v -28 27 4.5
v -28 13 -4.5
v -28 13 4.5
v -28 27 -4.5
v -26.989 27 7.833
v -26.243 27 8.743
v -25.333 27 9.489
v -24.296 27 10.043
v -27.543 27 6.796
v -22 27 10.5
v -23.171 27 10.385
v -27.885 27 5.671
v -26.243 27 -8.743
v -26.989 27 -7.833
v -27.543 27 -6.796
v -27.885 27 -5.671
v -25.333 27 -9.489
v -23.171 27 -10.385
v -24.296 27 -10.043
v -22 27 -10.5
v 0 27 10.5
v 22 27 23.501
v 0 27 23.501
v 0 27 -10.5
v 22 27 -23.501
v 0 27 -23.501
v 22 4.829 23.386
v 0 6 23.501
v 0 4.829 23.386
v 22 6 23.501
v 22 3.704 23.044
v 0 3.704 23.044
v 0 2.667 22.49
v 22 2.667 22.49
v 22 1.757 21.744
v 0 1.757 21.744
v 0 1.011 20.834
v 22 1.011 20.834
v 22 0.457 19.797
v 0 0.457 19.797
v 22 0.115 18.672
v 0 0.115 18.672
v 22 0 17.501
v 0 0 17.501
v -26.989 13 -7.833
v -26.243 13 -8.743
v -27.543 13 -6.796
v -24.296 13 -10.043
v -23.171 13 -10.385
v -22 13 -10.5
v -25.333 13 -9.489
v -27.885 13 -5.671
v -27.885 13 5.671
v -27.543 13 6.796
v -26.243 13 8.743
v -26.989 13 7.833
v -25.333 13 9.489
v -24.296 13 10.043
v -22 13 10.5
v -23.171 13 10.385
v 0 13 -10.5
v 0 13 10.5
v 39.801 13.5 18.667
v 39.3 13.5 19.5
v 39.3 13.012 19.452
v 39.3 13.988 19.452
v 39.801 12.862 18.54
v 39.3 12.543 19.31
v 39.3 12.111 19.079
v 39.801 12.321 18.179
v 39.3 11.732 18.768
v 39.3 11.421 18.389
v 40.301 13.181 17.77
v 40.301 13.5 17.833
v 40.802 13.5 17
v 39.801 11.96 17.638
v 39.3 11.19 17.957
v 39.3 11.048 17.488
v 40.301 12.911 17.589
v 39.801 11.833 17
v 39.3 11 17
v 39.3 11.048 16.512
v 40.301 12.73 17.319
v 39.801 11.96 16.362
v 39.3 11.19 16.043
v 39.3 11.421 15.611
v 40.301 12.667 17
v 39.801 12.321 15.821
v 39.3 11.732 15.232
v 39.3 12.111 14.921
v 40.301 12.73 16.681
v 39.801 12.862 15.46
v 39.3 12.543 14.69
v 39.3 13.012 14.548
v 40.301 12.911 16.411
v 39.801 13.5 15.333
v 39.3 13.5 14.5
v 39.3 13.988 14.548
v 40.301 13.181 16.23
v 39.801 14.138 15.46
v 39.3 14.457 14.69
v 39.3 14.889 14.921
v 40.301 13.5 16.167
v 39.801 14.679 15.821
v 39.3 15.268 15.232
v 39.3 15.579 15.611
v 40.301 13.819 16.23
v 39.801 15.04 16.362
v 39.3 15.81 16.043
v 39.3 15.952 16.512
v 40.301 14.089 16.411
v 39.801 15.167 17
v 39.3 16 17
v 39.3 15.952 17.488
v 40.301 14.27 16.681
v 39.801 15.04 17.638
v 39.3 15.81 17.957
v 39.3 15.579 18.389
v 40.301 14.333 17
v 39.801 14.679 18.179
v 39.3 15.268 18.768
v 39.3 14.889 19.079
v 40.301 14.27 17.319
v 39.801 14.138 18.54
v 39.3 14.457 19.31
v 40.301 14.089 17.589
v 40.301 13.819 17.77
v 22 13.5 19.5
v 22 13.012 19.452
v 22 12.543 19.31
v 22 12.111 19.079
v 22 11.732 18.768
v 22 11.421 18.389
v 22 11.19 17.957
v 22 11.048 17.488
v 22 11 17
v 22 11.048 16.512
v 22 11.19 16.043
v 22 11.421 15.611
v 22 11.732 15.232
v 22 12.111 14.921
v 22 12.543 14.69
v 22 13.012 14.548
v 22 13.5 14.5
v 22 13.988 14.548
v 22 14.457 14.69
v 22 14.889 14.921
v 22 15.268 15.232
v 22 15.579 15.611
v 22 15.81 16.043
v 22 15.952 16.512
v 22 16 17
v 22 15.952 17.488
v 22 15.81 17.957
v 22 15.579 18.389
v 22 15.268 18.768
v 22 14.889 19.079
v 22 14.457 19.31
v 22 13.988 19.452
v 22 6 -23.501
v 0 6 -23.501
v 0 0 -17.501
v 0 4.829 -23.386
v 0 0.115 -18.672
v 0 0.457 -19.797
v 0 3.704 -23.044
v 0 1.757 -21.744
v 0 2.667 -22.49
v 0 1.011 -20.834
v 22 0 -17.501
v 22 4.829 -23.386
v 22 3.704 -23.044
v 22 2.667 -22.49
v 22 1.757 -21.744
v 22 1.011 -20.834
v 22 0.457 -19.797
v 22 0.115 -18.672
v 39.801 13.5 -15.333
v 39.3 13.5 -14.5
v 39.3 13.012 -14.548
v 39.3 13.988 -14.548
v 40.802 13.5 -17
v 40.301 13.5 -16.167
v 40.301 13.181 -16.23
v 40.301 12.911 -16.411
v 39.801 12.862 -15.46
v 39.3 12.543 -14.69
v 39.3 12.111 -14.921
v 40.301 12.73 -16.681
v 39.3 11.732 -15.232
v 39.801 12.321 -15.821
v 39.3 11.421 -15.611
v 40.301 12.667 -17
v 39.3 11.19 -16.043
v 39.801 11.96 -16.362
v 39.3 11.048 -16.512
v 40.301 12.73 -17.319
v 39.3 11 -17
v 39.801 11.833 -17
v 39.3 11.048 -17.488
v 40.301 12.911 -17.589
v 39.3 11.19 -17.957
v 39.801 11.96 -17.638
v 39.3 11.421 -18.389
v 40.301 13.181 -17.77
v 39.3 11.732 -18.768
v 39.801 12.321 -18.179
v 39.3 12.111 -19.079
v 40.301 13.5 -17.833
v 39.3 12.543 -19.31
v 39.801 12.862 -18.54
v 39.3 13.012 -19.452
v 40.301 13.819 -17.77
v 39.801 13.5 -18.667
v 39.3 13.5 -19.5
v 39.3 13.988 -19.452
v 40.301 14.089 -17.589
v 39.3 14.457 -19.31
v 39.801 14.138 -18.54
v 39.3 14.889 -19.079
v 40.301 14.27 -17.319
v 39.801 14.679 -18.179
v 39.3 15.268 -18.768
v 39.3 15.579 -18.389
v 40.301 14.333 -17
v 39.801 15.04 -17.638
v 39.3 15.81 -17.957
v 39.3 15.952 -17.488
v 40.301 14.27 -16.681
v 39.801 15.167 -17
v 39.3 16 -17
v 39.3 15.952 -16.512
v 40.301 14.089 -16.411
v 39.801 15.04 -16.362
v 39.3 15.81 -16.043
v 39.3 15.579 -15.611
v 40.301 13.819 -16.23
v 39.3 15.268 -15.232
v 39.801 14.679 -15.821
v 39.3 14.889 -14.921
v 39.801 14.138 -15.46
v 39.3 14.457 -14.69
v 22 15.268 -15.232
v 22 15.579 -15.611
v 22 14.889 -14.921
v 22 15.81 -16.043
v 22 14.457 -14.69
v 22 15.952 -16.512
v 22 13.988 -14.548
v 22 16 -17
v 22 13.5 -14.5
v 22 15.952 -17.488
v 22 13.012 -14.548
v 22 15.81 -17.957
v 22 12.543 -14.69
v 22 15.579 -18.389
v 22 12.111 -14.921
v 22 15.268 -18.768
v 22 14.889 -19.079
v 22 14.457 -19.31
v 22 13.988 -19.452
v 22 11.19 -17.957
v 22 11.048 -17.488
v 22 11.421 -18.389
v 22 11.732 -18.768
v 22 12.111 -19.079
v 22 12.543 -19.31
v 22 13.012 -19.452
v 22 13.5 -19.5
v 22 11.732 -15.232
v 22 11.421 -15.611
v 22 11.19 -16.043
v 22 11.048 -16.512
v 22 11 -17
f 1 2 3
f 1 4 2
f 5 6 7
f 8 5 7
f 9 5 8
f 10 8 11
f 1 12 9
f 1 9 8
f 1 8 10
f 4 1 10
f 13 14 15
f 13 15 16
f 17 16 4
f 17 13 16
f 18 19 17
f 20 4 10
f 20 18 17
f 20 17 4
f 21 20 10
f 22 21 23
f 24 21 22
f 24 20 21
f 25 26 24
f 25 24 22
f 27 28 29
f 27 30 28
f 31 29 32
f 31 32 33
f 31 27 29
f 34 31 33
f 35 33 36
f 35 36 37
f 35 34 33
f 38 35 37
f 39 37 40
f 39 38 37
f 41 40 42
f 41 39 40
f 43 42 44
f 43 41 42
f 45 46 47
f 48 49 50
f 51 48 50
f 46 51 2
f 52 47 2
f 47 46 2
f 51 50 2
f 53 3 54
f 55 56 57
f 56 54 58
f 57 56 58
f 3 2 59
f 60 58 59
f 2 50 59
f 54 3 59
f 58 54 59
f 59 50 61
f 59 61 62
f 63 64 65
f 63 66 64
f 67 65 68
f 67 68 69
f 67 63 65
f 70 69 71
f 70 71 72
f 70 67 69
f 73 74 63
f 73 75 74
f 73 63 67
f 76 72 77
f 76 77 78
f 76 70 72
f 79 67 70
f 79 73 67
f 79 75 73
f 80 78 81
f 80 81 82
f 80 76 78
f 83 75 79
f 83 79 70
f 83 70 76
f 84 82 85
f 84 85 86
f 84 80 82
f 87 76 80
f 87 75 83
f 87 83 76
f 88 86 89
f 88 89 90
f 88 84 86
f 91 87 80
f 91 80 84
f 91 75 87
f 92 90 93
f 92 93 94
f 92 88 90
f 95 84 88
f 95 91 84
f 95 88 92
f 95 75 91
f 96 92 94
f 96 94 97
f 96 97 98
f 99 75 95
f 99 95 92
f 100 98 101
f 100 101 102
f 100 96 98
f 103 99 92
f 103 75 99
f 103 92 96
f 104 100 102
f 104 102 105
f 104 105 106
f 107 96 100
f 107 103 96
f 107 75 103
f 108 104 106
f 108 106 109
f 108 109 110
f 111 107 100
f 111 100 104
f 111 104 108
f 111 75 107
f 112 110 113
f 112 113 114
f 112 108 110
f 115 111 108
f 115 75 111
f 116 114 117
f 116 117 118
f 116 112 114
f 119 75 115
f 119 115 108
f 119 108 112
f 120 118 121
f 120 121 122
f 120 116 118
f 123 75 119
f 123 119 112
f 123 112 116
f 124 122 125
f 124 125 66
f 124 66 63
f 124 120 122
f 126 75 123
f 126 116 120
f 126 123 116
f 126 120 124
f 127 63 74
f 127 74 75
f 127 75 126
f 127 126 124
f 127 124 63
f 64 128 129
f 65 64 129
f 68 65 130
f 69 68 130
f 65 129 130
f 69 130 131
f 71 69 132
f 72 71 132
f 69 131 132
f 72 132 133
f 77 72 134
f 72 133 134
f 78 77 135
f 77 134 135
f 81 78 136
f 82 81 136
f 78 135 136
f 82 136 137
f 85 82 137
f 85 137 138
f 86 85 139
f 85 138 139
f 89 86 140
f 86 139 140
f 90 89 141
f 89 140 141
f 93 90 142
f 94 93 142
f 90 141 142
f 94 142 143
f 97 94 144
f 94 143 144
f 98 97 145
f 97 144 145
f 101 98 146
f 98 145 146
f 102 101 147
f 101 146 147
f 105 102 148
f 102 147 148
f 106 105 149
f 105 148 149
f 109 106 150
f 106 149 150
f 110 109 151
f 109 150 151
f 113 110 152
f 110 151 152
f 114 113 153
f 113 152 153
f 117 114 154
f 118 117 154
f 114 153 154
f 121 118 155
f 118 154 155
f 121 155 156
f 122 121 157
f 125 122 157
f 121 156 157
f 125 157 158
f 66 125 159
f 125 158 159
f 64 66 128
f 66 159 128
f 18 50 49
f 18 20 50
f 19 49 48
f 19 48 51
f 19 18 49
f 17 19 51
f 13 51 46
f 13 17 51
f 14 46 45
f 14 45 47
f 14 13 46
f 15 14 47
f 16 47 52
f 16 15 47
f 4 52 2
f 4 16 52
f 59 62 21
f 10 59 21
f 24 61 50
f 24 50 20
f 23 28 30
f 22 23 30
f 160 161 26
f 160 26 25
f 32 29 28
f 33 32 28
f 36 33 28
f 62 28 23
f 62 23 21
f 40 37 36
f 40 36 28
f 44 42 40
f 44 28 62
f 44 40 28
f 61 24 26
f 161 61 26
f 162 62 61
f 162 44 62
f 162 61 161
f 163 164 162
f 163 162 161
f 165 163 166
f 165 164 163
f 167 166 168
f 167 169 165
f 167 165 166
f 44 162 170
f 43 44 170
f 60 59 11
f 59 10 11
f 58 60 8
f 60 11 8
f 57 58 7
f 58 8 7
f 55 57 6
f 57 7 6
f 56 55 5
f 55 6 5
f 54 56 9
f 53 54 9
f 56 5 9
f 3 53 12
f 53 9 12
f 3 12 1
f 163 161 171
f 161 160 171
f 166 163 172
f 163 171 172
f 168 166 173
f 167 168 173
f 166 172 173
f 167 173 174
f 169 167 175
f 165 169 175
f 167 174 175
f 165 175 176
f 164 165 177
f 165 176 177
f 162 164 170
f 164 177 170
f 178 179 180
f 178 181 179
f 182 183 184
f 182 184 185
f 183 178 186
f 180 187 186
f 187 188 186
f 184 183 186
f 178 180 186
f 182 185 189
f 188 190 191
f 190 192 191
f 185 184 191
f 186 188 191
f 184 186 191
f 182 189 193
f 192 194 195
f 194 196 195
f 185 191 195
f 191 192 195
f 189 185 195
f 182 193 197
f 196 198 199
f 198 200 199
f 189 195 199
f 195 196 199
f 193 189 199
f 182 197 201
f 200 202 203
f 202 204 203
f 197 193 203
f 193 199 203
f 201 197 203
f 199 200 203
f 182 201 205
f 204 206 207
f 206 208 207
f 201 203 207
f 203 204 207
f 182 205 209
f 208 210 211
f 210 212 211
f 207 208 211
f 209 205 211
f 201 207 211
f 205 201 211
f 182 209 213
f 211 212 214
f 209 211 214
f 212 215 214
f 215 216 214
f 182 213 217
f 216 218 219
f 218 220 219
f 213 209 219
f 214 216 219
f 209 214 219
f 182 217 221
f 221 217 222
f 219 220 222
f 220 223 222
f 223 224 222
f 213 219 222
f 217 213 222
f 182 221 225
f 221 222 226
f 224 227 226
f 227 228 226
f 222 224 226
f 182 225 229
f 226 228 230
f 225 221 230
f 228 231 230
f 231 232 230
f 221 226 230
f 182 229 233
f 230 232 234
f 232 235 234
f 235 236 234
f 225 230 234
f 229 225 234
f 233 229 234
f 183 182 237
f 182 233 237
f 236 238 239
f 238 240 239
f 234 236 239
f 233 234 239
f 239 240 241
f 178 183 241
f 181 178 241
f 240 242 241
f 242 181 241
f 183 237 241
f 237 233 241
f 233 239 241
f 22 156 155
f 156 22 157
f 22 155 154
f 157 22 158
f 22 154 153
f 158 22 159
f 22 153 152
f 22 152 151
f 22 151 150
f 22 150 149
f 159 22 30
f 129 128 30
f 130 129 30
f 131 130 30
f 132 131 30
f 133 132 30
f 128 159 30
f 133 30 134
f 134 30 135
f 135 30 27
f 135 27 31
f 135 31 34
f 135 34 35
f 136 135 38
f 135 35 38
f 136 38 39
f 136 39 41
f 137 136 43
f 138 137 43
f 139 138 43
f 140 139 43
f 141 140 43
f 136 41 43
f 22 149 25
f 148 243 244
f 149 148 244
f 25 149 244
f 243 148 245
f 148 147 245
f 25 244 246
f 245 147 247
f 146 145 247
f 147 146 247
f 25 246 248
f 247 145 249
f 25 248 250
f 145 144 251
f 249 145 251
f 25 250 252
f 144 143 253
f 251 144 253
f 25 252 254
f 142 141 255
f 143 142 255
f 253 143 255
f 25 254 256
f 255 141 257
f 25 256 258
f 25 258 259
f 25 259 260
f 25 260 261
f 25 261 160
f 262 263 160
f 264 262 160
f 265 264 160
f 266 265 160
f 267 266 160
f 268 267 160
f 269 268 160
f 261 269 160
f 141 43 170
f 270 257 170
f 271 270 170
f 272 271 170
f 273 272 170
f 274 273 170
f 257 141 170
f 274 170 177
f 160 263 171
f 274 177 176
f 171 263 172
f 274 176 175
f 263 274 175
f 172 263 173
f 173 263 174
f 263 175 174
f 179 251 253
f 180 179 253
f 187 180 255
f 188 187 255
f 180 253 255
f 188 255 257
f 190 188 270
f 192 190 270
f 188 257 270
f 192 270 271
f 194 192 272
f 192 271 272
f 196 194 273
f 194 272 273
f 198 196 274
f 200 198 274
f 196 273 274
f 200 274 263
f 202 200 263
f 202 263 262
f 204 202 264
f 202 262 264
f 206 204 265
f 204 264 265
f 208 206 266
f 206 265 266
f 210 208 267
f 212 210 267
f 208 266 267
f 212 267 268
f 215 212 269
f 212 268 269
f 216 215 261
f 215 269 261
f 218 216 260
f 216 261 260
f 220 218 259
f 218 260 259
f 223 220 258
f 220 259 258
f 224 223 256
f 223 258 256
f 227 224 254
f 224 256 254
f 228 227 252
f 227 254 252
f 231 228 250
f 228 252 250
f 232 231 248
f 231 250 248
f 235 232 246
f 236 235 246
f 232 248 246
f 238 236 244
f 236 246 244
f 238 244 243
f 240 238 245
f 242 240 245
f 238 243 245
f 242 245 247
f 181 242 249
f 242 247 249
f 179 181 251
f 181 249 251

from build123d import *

# Parameters (mm, degrees)
SKIZZE1_W                       = 22
SKIZZE1_H                       = 47.002
AUFSATZ_LINEAR_AUSTRAGEN1_DEPTH = 27
VERRUNDUNG1_R                   = 6
SKIZZE2_W                       = 21
SKIZZE2_H                       = 14
AUFSATZ_LINEAR_AUSTRAGEN2_DEPTH = 28
VERRUNDUNG2_R                   = 6
SKIZZE3_R                       = 2.5
AUFSATZ_LINEAR_AUSTRAGEN3_DEPTH = 17.3


with BuildPart() as part:
    # Skizze1 → Aufsatz-Linear austragen1 (new body)
    with BuildSketch(Plane(origin=(0, 0, 0), x_dir=(1, 0, 0), z_dir=(0, 1, 0))):
        with Locations((11, 0)):
            Rectangle(SKIZZE1_W, SKIZZE1_H)
    extrude(amount=AUFSATZ_LINEAR_AUSTRAGEN1_DEPTH)

    # Verrundung1
    verrundung1_edges = [part.edges().sort_by_distance(p)[0] for p in [
        (11, 0, -23.501),
        (11, 0, 23.501),
    ]]
    fillet(verrundung1_edges, radius=VERRUNDUNG1_R)

    # Skizze2 → Aufsatz-Linear austragen2 (add)
    with BuildSketch(Plane.ZY):
        with Locations((0, 20)):
            Rectangle(SKIZZE2_W, SKIZZE2_H)
    extrude(amount=AUFSATZ_LINEAR_AUSTRAGEN2_DEPTH)

    # Verrundung2
    verrundung2_edges = [part.edges().sort_by_distance(p)[0] for p in [
        (-28, 20, -10.5),
        (-28, 20, 10.5),
    ]]
    fillet(verrundung2_edges, radius=VERRUNDUNG2_R)

    # Skizze3 → Aufsatz-Linear austragen3 (add)
    with BuildSketch(Plane(origin=(22, 0, 0), x_dir=(0, 0, -1), z_dir=(1, 0, 0))):
        with Locations(Location((17, 13.5, 0), (0, 0, 180))):
            Circle(SKIZZE3_R)
        with Locations(Location((-17, 13.5, 0), (0, 0, 180))):
            Circle(SKIZZE3_R)
    extrude(amount=AUFSATZ_LINEAR_AUSTRAGEN3_DEPTH)

    # Skizze4 → Rotation2 (revolve)
    with BuildSketch(Plane(origin=(0, 13.5, 0), x_dir=(-1, 0, 0), z_dir=(0, 1, 0)), mode=Mode.PRIVATE) as rotation2_sk:
        Polygon((-39.3, 14.5), (-40.802151548, 17), (-39.3, 17), align=None)
    revolve(rotation2_sk.sketch.rotate(Axis((39.3, 13.5, 17), (1, 0, 0)), 180), axis=Axis((39.3, 13.5, 17), (1, 0, 0)))

    # Skizze5 → Rotation3 (revolve)
    with BuildSketch(Plane(origin=(0, 13.5, 0), x_dir=(-1, 0, 0), z_dir=(0, 1, 0)), mode=Mode.PRIVATE) as rotation3_sk:
        Polygon((-39.3, -19.5), (-39.3, -17), (-40.802151548, -17), align=None)
    revolve(rotation3_sk.sketch.rotate(Axis((39.3, 13.5, -17), (1, 0, 0)), 180), axis=Axis((39.3, 13.5, -17), (1, 0, 0)))


solid = part.part
